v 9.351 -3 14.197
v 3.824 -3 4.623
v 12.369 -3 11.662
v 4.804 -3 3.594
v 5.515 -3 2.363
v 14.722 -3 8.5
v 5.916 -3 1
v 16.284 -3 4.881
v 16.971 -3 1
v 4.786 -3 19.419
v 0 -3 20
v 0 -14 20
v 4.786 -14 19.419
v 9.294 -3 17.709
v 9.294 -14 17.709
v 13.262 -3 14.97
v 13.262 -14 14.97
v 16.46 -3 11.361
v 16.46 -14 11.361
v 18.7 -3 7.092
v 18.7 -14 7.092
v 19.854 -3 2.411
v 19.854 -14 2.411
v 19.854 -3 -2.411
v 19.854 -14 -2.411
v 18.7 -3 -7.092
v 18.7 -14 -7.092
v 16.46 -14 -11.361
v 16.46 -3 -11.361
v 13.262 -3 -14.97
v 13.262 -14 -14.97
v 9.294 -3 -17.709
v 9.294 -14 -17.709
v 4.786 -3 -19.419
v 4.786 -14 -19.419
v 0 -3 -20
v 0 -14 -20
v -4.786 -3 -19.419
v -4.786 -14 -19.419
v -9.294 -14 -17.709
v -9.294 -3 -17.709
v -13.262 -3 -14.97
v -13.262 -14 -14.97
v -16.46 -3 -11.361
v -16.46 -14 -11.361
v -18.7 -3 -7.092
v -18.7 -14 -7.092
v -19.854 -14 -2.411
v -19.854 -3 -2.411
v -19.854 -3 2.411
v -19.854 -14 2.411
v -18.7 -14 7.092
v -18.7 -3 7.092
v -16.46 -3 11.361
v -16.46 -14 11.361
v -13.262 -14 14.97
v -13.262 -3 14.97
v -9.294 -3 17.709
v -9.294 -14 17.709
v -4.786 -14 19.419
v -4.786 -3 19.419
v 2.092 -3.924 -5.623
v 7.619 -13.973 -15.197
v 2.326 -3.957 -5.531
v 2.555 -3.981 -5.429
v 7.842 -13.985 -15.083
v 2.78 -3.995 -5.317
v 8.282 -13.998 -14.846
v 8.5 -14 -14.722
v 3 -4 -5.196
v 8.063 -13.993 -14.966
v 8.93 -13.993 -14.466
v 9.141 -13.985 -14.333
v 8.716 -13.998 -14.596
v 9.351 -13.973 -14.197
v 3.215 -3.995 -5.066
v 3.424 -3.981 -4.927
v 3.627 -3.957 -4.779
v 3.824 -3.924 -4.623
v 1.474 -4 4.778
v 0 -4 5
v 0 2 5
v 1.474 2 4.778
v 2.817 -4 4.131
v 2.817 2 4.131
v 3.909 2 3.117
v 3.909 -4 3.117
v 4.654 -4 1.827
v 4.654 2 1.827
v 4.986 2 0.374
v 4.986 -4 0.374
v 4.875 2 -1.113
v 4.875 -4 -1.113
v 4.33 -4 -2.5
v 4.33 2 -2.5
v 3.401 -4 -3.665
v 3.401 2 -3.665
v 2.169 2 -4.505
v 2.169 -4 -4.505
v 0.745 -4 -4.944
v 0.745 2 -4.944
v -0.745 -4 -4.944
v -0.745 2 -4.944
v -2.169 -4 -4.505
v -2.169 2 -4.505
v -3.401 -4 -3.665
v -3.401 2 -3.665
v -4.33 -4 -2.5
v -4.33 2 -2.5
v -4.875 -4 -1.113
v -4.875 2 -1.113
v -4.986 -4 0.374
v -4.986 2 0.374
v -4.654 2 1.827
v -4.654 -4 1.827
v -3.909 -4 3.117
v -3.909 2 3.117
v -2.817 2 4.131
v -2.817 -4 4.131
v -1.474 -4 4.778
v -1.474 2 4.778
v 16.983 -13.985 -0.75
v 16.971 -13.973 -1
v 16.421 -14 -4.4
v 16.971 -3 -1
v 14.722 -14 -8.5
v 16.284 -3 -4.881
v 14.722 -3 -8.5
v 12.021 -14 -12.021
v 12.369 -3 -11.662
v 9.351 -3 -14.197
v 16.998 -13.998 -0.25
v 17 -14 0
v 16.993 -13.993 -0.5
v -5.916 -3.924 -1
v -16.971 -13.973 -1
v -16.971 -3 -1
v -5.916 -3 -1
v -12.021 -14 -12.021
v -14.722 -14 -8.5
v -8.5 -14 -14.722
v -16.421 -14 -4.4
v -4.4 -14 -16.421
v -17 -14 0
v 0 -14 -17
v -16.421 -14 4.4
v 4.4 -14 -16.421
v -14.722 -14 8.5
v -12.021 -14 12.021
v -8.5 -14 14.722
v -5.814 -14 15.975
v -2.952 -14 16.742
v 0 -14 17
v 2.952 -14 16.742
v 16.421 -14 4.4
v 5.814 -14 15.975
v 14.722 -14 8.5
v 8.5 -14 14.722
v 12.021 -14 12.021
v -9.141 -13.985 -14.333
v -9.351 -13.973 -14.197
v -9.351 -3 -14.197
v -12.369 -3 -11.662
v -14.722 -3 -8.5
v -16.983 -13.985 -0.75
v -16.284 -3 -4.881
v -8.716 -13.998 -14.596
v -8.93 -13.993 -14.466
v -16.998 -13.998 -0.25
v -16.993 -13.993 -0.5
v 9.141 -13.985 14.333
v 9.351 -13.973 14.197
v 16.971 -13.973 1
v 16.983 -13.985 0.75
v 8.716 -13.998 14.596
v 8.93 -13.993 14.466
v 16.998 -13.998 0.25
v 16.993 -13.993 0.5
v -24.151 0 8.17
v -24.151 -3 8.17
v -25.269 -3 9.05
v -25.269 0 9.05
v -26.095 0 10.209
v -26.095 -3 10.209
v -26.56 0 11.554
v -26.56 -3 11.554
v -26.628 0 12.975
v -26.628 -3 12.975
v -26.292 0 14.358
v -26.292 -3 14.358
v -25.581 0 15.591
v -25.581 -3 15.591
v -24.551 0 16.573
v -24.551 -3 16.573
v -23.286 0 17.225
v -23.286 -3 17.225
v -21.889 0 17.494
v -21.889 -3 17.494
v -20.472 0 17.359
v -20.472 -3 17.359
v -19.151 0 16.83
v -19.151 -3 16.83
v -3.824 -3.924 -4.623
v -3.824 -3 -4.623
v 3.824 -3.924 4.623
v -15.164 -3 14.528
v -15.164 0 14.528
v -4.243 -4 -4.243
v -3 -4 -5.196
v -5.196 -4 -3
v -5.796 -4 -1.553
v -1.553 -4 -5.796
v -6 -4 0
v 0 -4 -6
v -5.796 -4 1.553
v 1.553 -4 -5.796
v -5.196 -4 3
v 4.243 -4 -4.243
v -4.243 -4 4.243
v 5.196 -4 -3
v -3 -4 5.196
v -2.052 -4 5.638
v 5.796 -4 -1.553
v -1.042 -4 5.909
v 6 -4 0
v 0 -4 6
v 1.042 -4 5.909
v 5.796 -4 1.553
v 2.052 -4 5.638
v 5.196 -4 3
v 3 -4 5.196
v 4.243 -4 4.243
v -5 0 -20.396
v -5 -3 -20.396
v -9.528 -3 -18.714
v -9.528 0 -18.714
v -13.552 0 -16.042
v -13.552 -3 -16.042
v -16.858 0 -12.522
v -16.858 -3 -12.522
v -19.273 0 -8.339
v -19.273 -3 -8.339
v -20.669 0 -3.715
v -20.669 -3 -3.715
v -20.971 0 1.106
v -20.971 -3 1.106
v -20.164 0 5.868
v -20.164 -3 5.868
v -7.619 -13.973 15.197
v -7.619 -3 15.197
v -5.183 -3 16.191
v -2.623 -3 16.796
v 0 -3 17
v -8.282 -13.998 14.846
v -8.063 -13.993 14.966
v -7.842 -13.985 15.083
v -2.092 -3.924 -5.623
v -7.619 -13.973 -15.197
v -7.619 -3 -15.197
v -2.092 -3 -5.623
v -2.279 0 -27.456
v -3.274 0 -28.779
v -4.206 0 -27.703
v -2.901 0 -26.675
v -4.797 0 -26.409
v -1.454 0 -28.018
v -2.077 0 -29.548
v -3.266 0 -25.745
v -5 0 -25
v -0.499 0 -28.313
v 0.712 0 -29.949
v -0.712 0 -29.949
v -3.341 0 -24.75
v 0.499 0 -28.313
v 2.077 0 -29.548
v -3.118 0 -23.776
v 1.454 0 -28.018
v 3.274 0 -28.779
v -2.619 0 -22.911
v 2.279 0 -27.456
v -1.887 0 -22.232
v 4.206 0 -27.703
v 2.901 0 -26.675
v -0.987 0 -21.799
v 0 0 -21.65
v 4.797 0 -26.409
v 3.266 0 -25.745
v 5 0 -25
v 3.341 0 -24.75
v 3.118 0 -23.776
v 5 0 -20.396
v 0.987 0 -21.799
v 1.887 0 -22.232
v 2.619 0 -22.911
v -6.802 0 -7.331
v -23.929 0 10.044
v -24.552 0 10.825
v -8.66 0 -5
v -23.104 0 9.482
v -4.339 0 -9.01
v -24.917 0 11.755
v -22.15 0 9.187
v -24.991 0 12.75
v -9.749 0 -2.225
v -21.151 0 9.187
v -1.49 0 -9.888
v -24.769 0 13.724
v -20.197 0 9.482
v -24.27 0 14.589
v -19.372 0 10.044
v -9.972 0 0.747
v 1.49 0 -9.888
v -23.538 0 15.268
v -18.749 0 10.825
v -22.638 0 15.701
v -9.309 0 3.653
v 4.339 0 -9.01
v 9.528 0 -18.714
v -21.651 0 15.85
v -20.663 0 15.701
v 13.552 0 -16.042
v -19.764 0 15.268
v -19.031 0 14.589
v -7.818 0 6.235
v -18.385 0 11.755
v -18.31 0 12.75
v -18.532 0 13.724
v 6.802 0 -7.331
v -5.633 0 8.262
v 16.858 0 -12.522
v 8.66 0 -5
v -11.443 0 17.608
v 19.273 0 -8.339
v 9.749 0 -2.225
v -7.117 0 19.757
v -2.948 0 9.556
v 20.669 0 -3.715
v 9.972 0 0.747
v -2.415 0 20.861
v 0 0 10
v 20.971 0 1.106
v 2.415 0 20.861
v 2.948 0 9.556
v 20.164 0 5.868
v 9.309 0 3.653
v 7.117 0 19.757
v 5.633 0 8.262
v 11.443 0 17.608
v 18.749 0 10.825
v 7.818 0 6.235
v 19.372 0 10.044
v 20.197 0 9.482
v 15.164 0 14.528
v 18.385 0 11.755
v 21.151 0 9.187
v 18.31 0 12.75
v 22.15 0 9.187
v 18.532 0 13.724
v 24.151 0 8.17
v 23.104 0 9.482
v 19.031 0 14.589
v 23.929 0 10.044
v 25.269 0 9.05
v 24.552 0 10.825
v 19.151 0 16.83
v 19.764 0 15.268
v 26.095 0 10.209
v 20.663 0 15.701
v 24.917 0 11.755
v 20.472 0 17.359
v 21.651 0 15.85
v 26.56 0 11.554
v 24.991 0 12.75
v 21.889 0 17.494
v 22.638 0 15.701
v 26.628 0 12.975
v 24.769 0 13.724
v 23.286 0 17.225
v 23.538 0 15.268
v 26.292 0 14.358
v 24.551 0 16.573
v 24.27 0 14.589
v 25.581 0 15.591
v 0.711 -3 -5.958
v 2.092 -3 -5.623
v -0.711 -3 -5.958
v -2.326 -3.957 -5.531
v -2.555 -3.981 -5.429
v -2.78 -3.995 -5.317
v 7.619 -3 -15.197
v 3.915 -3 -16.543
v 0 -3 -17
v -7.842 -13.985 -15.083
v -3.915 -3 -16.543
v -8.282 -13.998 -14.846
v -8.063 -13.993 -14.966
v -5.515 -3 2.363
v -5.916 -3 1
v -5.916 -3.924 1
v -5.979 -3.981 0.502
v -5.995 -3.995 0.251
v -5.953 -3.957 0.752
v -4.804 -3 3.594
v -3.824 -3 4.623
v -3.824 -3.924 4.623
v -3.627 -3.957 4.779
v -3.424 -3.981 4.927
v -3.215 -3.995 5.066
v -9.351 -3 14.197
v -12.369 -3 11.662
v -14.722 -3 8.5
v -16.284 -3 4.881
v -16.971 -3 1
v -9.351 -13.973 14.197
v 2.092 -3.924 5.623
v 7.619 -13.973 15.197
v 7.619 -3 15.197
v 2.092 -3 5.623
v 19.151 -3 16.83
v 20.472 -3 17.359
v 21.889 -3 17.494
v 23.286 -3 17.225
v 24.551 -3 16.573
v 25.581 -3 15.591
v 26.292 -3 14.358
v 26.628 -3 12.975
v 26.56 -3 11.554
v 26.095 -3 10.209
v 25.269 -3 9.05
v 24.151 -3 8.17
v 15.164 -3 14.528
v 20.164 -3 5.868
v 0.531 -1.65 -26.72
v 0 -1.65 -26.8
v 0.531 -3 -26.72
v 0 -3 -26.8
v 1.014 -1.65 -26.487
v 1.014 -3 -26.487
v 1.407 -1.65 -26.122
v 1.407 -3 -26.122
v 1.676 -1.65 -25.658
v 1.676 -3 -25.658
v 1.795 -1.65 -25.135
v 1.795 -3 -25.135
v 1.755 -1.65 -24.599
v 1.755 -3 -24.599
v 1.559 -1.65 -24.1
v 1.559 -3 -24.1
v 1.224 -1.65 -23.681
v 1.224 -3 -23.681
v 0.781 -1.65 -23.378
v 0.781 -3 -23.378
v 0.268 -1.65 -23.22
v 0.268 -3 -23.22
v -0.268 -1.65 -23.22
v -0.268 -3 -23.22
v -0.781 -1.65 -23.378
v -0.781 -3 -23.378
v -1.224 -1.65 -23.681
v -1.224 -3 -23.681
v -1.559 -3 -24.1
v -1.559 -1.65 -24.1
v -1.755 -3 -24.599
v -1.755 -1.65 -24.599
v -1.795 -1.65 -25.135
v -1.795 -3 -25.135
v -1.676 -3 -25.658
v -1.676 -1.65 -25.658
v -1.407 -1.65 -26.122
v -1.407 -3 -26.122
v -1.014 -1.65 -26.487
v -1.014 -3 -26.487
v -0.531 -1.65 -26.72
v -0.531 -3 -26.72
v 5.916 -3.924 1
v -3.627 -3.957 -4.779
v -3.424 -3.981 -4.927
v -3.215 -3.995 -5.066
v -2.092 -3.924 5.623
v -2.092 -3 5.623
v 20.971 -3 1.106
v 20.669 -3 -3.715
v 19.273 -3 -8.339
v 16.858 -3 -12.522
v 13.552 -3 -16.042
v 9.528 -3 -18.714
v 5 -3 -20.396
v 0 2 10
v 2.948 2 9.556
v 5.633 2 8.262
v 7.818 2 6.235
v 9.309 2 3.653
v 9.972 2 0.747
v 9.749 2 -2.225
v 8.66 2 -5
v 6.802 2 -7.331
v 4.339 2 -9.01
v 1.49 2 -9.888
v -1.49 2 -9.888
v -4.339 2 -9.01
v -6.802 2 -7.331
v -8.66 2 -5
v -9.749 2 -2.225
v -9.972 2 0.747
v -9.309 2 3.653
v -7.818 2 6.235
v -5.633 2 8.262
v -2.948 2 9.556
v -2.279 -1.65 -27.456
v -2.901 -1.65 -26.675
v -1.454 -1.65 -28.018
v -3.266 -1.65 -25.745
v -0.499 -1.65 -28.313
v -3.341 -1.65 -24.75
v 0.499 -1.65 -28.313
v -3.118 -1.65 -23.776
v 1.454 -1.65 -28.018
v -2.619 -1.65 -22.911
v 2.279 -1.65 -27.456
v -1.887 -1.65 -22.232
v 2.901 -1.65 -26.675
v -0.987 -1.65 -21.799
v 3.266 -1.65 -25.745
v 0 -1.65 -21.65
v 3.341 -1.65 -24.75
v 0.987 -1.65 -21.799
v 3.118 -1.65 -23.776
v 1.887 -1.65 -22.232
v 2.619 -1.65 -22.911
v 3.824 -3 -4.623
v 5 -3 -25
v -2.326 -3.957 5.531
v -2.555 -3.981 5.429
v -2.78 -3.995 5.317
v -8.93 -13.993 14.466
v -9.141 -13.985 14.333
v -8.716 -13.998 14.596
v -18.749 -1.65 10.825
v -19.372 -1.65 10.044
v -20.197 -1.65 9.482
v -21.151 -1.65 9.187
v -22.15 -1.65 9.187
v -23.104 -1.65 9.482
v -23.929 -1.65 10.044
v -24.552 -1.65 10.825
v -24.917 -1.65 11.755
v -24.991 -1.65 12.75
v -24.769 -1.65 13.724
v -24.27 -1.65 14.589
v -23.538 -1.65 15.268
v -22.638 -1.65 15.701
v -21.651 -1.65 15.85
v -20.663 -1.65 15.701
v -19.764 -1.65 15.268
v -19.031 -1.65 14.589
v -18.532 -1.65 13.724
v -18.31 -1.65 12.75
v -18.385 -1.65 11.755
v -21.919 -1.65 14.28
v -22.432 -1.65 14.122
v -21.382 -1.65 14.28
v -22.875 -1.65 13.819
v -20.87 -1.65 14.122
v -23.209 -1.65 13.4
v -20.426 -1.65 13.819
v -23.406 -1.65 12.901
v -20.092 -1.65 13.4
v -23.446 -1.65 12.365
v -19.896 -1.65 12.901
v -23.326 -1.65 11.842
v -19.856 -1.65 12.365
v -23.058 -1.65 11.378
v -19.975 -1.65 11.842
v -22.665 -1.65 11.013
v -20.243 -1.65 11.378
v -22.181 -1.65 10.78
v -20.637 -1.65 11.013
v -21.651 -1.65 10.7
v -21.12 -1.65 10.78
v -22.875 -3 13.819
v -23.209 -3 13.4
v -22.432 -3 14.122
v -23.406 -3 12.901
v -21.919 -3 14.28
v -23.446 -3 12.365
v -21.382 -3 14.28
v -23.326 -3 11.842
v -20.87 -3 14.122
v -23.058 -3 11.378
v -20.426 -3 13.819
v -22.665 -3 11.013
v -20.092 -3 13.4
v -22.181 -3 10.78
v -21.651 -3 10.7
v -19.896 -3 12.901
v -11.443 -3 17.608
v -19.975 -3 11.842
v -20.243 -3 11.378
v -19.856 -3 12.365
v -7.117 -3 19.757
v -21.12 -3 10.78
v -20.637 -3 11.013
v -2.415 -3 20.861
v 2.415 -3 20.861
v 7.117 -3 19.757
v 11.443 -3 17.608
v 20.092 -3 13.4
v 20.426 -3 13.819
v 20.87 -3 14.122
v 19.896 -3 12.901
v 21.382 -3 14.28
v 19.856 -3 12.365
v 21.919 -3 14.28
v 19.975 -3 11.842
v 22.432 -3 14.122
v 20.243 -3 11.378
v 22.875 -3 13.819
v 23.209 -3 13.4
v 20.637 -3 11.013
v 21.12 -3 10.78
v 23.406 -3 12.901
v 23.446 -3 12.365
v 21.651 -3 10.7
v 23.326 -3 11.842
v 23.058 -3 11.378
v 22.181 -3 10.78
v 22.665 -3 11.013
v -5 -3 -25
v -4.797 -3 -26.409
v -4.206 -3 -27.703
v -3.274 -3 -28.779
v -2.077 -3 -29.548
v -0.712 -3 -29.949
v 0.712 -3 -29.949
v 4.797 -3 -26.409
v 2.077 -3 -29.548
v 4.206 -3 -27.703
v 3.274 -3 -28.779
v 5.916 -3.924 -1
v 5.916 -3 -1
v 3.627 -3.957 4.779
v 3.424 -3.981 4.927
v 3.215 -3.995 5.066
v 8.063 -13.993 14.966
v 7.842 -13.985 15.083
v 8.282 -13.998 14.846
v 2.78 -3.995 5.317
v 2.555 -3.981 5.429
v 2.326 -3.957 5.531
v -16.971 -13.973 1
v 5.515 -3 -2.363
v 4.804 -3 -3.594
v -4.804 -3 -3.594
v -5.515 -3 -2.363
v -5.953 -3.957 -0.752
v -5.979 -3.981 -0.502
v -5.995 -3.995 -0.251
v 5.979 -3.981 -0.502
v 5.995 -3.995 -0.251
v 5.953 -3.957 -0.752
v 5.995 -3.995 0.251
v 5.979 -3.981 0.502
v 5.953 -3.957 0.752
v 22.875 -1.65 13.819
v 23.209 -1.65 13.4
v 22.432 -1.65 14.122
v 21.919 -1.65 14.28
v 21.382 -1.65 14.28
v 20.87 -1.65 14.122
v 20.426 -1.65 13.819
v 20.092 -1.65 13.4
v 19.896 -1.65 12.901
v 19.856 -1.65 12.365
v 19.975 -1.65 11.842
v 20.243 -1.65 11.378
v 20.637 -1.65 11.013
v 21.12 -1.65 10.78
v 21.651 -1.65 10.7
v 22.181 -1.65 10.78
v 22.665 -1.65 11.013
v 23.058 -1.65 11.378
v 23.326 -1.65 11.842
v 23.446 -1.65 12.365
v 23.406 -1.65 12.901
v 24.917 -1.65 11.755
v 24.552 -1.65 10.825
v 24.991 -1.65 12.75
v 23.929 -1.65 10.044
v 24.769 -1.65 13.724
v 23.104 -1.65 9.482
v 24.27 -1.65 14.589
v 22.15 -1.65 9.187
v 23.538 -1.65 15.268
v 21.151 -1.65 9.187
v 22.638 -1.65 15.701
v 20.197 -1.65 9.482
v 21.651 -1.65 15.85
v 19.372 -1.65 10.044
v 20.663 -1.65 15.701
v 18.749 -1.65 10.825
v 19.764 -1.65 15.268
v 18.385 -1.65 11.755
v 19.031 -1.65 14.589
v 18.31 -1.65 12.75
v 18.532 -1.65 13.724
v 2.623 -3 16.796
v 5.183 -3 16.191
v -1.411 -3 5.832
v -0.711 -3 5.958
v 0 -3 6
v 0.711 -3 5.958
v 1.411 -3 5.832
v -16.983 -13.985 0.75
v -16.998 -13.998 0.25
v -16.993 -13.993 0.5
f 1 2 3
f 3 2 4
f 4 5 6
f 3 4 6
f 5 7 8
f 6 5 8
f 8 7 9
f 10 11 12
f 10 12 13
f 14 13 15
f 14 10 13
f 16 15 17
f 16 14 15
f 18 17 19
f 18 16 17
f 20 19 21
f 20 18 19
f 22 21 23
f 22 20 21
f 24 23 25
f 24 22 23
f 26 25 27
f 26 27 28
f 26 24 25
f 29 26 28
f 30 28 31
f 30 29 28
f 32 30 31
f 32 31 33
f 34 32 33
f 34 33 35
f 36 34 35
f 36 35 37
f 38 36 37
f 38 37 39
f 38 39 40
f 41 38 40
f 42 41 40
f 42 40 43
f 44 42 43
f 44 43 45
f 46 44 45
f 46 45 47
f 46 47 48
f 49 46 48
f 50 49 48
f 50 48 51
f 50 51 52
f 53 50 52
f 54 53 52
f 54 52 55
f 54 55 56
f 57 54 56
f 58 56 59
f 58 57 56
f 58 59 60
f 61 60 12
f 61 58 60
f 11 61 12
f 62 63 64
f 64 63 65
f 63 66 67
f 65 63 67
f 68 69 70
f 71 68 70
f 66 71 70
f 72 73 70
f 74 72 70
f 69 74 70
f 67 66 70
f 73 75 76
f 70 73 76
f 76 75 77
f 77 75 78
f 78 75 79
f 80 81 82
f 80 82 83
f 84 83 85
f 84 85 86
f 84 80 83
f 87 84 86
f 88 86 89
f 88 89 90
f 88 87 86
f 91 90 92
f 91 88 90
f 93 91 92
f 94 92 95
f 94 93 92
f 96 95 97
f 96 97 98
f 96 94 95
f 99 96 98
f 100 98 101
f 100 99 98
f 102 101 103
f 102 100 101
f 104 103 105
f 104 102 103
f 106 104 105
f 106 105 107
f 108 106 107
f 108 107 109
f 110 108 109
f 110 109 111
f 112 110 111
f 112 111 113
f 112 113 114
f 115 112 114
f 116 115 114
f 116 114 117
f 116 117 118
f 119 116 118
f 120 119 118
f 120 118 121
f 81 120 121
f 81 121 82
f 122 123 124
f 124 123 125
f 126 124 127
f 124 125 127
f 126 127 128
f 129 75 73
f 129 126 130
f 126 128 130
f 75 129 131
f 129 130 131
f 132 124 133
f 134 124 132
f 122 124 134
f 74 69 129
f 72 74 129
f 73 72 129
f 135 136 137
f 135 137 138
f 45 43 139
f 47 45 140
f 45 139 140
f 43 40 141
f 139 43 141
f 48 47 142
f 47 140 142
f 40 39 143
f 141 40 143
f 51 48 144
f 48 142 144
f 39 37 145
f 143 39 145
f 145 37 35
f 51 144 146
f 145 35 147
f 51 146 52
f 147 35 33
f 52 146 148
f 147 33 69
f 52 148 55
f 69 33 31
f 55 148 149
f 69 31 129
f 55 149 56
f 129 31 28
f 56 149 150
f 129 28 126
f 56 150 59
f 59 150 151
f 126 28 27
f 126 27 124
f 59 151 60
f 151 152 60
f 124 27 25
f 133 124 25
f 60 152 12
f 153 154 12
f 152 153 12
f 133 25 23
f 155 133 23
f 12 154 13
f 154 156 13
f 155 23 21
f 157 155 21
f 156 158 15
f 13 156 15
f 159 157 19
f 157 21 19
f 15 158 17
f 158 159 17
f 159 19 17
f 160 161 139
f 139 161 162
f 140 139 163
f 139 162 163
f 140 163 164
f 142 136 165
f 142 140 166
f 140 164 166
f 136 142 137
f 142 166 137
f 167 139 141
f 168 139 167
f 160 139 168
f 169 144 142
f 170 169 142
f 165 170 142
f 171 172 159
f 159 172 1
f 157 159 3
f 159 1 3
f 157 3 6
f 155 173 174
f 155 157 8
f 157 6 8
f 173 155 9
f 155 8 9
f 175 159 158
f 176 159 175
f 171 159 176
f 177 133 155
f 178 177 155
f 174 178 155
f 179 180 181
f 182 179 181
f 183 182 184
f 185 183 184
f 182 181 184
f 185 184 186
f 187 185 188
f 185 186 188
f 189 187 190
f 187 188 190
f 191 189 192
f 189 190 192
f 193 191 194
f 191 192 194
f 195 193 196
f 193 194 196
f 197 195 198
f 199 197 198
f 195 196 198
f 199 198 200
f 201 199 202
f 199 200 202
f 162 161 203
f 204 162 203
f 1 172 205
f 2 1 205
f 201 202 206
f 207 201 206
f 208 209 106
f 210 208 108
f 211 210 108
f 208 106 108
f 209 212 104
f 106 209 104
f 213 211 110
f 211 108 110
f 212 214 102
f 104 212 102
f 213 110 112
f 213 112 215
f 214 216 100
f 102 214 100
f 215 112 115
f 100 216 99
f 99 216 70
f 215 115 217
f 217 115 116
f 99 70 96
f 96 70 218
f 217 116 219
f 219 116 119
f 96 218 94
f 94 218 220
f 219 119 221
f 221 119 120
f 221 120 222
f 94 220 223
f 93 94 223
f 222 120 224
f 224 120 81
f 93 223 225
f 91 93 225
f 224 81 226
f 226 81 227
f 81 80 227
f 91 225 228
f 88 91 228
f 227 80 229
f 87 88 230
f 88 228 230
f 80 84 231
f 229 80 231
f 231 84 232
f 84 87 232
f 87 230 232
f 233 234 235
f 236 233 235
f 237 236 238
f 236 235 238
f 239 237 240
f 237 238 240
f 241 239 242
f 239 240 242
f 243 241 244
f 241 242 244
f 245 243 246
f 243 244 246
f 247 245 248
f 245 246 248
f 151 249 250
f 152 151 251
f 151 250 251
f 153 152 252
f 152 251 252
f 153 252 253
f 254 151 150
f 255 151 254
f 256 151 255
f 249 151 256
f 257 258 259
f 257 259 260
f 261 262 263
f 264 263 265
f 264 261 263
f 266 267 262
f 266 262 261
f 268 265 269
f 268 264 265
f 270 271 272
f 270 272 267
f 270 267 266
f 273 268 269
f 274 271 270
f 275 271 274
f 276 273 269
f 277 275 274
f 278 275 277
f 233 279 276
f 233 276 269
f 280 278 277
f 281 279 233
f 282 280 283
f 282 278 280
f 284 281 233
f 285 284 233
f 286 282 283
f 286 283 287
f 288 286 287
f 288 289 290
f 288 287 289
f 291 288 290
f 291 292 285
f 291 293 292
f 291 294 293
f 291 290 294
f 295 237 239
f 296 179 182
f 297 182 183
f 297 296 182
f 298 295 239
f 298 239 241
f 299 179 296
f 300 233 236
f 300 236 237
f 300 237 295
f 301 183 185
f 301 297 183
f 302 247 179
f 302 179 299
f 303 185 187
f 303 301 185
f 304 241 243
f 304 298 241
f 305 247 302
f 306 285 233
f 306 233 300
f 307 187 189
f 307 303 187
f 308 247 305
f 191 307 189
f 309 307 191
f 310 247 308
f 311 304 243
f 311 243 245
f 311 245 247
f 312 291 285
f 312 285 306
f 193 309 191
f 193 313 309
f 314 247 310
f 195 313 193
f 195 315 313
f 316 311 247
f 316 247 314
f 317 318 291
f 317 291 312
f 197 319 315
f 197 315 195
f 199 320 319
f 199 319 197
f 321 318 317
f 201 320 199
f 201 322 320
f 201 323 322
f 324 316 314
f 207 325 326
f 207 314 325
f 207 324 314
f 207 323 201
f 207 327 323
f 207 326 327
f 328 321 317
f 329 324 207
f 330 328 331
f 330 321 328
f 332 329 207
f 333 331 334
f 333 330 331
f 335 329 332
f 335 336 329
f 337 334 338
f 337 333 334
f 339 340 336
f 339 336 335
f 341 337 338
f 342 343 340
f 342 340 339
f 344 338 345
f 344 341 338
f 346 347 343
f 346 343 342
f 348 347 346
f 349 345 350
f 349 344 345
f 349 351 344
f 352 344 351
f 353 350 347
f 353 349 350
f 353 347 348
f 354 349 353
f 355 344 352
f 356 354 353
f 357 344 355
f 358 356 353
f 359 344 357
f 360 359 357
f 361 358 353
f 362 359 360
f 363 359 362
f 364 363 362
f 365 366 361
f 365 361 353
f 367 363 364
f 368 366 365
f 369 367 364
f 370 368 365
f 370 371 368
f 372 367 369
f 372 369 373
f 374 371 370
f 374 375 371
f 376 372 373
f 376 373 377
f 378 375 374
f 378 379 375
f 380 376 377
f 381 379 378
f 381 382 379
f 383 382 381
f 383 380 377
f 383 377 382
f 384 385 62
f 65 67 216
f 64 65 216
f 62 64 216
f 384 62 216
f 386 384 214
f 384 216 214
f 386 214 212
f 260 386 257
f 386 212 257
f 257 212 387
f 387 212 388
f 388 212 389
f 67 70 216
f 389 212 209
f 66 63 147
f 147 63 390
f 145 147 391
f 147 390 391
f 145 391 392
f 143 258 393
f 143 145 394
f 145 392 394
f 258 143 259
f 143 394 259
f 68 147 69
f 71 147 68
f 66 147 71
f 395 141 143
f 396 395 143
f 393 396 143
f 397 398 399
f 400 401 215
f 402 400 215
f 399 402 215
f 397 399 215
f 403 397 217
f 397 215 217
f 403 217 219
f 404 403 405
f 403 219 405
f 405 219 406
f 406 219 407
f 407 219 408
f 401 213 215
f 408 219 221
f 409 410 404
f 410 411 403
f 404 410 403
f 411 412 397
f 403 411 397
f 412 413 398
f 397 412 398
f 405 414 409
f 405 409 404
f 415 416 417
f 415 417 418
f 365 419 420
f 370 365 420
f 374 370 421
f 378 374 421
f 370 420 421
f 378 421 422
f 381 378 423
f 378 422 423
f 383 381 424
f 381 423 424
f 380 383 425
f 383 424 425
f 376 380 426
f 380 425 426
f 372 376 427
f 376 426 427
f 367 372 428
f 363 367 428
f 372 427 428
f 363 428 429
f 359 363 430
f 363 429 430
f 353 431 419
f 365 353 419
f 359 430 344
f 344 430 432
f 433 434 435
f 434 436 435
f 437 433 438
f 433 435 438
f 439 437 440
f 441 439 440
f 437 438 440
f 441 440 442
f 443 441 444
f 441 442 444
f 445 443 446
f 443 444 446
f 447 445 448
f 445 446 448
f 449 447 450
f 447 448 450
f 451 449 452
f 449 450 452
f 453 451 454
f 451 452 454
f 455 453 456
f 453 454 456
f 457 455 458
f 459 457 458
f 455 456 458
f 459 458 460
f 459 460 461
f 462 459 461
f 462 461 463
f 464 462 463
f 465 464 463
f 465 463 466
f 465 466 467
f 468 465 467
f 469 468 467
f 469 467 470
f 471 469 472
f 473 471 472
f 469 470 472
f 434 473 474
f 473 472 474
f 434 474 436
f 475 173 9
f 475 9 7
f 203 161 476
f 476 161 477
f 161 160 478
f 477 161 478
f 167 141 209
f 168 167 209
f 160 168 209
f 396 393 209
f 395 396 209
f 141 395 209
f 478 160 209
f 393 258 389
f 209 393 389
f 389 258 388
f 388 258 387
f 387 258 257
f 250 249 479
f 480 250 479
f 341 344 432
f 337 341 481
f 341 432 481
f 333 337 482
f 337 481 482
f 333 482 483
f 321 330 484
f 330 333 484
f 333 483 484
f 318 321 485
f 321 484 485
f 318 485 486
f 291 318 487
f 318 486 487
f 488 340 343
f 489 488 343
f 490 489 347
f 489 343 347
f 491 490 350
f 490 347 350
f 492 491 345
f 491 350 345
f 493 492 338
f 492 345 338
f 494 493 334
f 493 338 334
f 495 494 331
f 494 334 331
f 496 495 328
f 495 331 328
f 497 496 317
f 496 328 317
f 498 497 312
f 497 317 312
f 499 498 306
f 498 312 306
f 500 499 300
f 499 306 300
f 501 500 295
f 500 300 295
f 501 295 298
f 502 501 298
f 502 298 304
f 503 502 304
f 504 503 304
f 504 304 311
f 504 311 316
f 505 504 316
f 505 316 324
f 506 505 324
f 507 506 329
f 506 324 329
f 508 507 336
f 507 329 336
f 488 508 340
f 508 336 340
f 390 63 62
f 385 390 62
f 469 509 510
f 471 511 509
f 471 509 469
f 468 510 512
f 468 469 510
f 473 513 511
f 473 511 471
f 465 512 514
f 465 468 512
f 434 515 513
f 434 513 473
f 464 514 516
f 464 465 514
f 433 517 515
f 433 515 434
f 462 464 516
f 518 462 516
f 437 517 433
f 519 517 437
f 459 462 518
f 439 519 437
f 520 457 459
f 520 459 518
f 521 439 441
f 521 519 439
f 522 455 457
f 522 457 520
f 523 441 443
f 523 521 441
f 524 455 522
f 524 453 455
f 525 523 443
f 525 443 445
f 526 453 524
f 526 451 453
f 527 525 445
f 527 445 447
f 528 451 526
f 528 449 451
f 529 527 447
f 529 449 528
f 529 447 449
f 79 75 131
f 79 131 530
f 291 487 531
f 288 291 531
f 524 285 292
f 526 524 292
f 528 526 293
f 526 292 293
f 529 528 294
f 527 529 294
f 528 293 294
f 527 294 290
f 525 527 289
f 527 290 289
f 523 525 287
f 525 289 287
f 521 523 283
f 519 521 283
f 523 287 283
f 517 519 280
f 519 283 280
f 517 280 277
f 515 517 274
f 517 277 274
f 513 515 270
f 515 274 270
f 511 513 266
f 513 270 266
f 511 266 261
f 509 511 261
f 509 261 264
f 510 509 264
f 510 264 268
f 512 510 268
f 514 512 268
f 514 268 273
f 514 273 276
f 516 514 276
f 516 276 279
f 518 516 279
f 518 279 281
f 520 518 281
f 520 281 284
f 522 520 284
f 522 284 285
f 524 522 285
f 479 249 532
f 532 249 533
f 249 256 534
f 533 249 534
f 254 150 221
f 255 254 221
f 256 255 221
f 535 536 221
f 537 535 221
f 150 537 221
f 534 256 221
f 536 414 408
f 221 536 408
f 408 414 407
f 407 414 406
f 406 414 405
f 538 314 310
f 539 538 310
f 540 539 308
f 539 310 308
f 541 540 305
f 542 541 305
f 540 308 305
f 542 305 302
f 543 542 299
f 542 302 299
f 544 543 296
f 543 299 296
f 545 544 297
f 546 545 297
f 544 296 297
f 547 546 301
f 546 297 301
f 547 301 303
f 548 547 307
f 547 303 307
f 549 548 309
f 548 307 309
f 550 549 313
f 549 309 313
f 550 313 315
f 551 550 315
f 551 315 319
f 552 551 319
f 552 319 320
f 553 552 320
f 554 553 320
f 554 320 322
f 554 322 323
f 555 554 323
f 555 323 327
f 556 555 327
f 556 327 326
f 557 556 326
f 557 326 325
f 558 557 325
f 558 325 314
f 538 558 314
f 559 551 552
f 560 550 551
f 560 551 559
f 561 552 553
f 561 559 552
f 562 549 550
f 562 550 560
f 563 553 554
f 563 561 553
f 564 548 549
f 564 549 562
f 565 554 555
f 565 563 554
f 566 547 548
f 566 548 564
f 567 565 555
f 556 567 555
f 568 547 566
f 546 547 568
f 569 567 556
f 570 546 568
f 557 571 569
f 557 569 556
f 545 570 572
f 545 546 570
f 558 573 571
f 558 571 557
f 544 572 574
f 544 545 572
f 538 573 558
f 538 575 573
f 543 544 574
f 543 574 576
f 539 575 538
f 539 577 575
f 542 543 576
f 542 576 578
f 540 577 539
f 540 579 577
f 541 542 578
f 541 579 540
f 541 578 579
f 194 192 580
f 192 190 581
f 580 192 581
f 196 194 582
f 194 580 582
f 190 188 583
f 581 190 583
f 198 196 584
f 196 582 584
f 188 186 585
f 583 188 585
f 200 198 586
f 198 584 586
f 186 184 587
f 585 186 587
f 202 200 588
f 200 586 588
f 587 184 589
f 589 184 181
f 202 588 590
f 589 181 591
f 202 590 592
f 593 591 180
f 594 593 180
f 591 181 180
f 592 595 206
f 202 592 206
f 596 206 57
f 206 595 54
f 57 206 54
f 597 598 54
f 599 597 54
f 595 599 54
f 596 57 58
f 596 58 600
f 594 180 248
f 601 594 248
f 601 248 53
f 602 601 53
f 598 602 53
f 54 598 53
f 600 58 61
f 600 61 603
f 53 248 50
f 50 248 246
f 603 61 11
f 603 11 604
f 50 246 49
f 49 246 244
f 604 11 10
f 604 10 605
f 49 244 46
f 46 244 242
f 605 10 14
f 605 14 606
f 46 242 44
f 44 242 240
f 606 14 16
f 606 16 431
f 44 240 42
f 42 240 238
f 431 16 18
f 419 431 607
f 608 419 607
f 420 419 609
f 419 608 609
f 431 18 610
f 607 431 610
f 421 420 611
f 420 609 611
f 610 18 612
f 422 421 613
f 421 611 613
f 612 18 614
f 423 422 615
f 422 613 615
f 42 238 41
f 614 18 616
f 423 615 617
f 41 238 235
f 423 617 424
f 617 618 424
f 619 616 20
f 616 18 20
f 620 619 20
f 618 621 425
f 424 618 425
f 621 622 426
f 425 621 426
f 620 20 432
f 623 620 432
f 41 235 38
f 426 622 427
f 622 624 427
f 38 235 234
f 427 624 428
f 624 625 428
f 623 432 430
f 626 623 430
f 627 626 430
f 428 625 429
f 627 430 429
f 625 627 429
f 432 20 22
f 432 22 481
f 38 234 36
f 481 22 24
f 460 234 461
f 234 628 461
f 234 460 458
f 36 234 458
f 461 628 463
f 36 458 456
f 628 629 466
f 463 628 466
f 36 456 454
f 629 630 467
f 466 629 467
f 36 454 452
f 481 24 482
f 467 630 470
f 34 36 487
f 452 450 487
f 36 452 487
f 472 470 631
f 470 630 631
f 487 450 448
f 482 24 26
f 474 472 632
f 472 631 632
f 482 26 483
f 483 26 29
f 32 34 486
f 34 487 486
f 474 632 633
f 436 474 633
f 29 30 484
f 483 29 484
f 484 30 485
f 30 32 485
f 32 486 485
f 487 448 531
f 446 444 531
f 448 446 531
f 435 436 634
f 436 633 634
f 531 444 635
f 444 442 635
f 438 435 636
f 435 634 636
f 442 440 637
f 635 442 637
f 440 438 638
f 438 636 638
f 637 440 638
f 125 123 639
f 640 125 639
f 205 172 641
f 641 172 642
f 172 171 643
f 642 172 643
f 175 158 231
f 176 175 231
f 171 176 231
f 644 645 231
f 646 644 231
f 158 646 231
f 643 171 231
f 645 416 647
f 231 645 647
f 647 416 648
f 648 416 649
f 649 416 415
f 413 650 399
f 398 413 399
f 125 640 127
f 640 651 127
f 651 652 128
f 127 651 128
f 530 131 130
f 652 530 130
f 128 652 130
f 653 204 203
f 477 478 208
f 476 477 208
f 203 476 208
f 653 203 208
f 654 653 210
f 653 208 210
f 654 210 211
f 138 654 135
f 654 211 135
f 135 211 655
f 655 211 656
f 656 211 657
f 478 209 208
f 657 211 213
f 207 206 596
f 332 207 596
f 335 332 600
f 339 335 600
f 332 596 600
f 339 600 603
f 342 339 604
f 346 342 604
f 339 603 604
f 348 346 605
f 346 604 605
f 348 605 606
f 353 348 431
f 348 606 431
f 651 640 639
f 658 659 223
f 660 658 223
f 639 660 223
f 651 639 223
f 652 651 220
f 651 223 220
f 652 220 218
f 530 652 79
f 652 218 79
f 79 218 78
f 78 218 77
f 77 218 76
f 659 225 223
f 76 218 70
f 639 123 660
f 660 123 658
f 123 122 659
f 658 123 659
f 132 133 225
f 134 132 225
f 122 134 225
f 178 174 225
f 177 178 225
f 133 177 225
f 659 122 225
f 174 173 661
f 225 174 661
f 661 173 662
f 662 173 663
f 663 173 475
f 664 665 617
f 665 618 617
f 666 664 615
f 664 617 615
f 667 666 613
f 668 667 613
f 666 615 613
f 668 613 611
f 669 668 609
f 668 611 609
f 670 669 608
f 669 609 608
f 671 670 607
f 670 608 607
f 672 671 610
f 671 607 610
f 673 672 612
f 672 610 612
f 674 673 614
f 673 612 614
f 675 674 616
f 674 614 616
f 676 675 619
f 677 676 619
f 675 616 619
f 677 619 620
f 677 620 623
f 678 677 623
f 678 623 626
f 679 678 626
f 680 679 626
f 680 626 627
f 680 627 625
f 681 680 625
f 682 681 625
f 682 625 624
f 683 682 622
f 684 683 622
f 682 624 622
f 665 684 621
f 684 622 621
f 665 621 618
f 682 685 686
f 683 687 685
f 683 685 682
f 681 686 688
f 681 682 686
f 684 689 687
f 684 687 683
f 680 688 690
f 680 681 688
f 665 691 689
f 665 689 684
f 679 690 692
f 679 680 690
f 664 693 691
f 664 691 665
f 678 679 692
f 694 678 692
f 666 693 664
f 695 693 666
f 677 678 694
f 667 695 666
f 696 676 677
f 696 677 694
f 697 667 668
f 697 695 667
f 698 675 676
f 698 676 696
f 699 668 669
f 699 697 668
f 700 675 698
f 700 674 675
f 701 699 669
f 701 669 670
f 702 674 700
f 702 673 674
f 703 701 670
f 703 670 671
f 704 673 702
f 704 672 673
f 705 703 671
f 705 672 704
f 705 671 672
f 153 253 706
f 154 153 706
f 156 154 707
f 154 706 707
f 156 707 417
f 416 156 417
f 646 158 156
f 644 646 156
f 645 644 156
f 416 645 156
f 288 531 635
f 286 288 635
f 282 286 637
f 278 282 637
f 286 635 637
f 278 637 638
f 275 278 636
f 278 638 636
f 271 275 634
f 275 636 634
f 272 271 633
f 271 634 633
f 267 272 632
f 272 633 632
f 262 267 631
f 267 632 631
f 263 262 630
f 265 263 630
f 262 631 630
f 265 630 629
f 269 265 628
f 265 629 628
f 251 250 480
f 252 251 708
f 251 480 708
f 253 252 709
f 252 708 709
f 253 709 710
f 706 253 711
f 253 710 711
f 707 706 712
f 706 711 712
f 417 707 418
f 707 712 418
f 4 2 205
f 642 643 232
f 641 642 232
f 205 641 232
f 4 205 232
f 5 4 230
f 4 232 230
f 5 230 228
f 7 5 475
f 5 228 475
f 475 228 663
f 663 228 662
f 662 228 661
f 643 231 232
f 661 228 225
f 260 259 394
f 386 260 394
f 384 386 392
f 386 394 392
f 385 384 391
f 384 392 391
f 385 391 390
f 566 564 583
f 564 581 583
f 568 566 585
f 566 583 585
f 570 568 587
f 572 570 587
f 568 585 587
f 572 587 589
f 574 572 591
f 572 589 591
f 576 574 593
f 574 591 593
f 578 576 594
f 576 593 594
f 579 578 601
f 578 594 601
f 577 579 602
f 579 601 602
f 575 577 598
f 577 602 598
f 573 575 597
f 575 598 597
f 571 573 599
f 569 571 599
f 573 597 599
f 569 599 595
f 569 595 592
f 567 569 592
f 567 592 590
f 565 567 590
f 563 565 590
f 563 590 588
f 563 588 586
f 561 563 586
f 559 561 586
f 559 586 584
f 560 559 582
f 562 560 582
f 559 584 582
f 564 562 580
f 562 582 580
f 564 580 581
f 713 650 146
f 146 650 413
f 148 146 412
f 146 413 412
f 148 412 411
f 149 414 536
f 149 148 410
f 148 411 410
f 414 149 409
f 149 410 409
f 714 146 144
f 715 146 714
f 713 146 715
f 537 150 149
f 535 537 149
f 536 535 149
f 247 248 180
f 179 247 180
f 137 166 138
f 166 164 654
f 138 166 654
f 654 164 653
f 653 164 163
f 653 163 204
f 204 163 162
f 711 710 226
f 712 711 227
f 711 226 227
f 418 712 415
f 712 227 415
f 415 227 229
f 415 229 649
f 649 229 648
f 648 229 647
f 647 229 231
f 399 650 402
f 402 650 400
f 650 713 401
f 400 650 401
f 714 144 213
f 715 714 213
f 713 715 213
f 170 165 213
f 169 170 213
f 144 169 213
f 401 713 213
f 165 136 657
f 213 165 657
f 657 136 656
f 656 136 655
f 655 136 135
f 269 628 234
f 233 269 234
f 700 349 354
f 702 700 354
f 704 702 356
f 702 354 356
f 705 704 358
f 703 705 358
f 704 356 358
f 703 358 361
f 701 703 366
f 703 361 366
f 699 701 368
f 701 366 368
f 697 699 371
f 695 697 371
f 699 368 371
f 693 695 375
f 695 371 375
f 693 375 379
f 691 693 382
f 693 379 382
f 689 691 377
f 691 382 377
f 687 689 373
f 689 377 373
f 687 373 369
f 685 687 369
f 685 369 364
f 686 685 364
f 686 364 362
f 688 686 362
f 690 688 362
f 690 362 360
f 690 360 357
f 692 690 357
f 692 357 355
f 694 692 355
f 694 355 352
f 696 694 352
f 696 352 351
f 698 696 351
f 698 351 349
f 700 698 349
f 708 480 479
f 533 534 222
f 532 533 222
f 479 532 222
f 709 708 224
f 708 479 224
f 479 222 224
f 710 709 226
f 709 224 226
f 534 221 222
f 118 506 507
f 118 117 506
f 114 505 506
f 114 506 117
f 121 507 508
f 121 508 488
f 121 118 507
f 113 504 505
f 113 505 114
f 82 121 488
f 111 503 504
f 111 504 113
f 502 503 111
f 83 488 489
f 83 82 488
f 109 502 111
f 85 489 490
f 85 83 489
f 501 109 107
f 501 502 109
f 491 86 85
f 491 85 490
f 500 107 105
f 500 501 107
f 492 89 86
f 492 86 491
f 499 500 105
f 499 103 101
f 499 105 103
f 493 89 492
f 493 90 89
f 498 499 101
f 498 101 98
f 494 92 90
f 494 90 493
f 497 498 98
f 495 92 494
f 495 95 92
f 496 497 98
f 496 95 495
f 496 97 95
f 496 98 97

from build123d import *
from build123d.topology import SkipClean

# Parameters (mm, degrees)
SKETCH2_R                                = 10
SKETCH2_R_2                              = 5
BOSS_EXTRUDE1_DEPTH                      = 2
BOSS_EXTRUDE2_START                      = -3
SKETCH2_3_R                              = 5
BOSS_EXTRUDE2_DEPTH                      = 3
BOSS_EXTRUDE3_START                      = -4
SKETCH2_4_R                              = 6
SKETCH2_4_R_2                            = 5
BOSS_EXTRUDE3_DEPTH                      = 4
SKETCH2_6_R                              = 20
SKETCH2_6_R_2                            = 17
BOSS_EXTRUDE4_DEPTH                      = 14
CBORE_FOR_M12_HEX_HEAD_BOLT1_D           = 3.6
CBORE_FOR_M12_HEX_HEAD_BOLT1_CBORE_D     = 6.7
CBORE_FOR_M12_HEX_HEAD_BOLT1_CBORE_DEPTH = 1.65
CIRPATTERN1_COUNT                        = 3
RIB1_REACH                               = 44.5
SKETCH4_WALL_W                           = 101.866218182
SKETCH4_WALL_H                           = 2
CIRPATTERN2_COUNT                        = 6


with BuildPart() as part:
    # Sketch2 → Boss-Extrude1 (new body)
    with BuildSketch(Plane(origin=(0, 0, 0), x_dir=(1, 0, 0), z_dir=(0, 1, 0))):
        Circle(SKETCH2_R)
        Circle(SKETCH2_R_2, mode=Mode.SUBTRACT)
    extrude(amount=BOSS_EXTRUDE1_DEPTH)

    # Sketch2<3> → Boss-Extrude2 (add)
    with BuildSketch(Plane(origin=(0, 0, 0), x_dir=(1, 0, 0), z_dir=(0, 1, 0)).offset(BOSS_EXTRUDE2_START)):
        with BuildLine():
            Line((5, 20.396078054), (5, 25))
            ThreePointArc((5, 25), (0, 30), (-5, 25))
            Line((-5, 25), (-5, 20.396078054))
            ThreePointArc((-5, 20.396078054), (-18.186533479, 10.5), (-20.163521733, -5.867912008))
            Line((-20.163521733, -5.867912008), (-24.150635095, -8.169872981))
            ThreePointArc((-24.150635095, -8.169872981), (-25.980762114, -15), (-19.150635095, -16.830127019))
            Line((-19.150635095, -16.830127019), (-15.163521733, -14.528166046))
            ThreePointArc((-15.163521733, -14.528166046), (0, -21), (15.163521733, -14.528166046))
            Line((15.163521733, -14.528166046), (19.150635095, -16.830127019))
            ThreePointArc((19.150635095, -16.830127019), (25.980762114, -15), (24.150635095, -8.169872981))
            Line((24.150635095, -8.169872981), (20.163521733, -5.867912008))
            ThreePointArc((20.163521733, -5.867912008), (18.186533479, 10.5), (5, 20.396078054))
        make_face()
        Circle(SKETCH2_3_R, mode=Mode.SUBTRACT)
    extrude(amount=BOSS_EXTRUDE2_DEPTH)

    # Sketch2<4> → Boss-Extrude3 (add)
    with BuildSketch(Plane(origin=(0, 0, 0), x_dir=(1, 0, 0), z_dir=(0, 1, 0)).offset(BOSS_EXTRUDE3_START)):
        Circle(SKETCH2_4_R)
        Circle(SKETCH2_4_R_2, mode=Mode.SUBTRACT)
    extrude(amount=BOSS_EXTRUDE3_DEPTH)

    # Sketch2<6> → Boss-Extrude4 (add)
    with BuildSketch(Plane(origin=(0, 0, 0), x_dir=(1, 0, 0), z_dir=(0, 1, 0))):
        Circle(SKETCH2_6_R)
        Circle(SKETCH2_6_R_2, mode=Mode.SUBTRACT)
    extrude(amount=-BOSS_EXTRUDE4_DEPTH)

    # CBORE for M12 Hex Head Bolt1 (through all)
    with Locations(Plane(origin=(0, 0, -25), x_dir=(0, 0, 1), z_dir=(0, 1, 0))):
        with Locations((0, 0)):
            cbore_for_m12_hex_head_bolt1 = CounterBoreHole(CBORE_FOR_M12_HEX_HEAD_BOLT1_D / 2, CBORE_FOR_M12_HEX_HEAD_BOLT1_CBORE_D / 2, CBORE_FOR_M12_HEX_HEAD_BOLT1_CBORE_DEPTH)

    # CirPattern1: CBORE for M12 Hex Head Bolt1 ×3 about axis
    cirpattern1_axis = Axis((0, 0, 0), (0, 1, 0))
    for i in range(1, CIRPATTERN1_COUNT):
        add(cbore_for_m12_hex_head_bolt1.rotate(cirpattern1_axis, i * 360 / CIRPATTERN1_COUNT), mode=Mode.SUBTRACT)

    # Sketch4 wall → Rib1 (add, up to next)
    with BuildSketch(Plane(origin=(-11.5, -9, 0), x_dir=(0.739940073396, 0.672672793996, 0), z_dir=(-0.672672793996, 0.739940073396, 0)), mode=Mode.PRIVATE) as rib1_sk1:
        Rectangle(SKETCH4_WALL_W, SKETCH4_WALL_H)
    rib1_tool1 = extrude(rib1_sk1.sketch, amount=RIB1_REACH, mode=Mode.PRIVATE) - part.part
    rib1 = rib1_tool1.solids().sort_by_distance((-11.5, -9, 0))[0]
    add(rib1)

    # CirPattern2: Rib1 ×6 about axis
    with SkipClean():  # the faces are left unmerged after this step: merging them gives an invalid solid
        cirpattern2_axis = Axis((0, -14, 0), (0, 1, 0))
        for i in range(1, CIRPATTERN2_COUNT):
            add(rib1.rotate(cirpattern2_axis, i * 360 / CIRPATTERN2_COUNT))


solid = part.part
